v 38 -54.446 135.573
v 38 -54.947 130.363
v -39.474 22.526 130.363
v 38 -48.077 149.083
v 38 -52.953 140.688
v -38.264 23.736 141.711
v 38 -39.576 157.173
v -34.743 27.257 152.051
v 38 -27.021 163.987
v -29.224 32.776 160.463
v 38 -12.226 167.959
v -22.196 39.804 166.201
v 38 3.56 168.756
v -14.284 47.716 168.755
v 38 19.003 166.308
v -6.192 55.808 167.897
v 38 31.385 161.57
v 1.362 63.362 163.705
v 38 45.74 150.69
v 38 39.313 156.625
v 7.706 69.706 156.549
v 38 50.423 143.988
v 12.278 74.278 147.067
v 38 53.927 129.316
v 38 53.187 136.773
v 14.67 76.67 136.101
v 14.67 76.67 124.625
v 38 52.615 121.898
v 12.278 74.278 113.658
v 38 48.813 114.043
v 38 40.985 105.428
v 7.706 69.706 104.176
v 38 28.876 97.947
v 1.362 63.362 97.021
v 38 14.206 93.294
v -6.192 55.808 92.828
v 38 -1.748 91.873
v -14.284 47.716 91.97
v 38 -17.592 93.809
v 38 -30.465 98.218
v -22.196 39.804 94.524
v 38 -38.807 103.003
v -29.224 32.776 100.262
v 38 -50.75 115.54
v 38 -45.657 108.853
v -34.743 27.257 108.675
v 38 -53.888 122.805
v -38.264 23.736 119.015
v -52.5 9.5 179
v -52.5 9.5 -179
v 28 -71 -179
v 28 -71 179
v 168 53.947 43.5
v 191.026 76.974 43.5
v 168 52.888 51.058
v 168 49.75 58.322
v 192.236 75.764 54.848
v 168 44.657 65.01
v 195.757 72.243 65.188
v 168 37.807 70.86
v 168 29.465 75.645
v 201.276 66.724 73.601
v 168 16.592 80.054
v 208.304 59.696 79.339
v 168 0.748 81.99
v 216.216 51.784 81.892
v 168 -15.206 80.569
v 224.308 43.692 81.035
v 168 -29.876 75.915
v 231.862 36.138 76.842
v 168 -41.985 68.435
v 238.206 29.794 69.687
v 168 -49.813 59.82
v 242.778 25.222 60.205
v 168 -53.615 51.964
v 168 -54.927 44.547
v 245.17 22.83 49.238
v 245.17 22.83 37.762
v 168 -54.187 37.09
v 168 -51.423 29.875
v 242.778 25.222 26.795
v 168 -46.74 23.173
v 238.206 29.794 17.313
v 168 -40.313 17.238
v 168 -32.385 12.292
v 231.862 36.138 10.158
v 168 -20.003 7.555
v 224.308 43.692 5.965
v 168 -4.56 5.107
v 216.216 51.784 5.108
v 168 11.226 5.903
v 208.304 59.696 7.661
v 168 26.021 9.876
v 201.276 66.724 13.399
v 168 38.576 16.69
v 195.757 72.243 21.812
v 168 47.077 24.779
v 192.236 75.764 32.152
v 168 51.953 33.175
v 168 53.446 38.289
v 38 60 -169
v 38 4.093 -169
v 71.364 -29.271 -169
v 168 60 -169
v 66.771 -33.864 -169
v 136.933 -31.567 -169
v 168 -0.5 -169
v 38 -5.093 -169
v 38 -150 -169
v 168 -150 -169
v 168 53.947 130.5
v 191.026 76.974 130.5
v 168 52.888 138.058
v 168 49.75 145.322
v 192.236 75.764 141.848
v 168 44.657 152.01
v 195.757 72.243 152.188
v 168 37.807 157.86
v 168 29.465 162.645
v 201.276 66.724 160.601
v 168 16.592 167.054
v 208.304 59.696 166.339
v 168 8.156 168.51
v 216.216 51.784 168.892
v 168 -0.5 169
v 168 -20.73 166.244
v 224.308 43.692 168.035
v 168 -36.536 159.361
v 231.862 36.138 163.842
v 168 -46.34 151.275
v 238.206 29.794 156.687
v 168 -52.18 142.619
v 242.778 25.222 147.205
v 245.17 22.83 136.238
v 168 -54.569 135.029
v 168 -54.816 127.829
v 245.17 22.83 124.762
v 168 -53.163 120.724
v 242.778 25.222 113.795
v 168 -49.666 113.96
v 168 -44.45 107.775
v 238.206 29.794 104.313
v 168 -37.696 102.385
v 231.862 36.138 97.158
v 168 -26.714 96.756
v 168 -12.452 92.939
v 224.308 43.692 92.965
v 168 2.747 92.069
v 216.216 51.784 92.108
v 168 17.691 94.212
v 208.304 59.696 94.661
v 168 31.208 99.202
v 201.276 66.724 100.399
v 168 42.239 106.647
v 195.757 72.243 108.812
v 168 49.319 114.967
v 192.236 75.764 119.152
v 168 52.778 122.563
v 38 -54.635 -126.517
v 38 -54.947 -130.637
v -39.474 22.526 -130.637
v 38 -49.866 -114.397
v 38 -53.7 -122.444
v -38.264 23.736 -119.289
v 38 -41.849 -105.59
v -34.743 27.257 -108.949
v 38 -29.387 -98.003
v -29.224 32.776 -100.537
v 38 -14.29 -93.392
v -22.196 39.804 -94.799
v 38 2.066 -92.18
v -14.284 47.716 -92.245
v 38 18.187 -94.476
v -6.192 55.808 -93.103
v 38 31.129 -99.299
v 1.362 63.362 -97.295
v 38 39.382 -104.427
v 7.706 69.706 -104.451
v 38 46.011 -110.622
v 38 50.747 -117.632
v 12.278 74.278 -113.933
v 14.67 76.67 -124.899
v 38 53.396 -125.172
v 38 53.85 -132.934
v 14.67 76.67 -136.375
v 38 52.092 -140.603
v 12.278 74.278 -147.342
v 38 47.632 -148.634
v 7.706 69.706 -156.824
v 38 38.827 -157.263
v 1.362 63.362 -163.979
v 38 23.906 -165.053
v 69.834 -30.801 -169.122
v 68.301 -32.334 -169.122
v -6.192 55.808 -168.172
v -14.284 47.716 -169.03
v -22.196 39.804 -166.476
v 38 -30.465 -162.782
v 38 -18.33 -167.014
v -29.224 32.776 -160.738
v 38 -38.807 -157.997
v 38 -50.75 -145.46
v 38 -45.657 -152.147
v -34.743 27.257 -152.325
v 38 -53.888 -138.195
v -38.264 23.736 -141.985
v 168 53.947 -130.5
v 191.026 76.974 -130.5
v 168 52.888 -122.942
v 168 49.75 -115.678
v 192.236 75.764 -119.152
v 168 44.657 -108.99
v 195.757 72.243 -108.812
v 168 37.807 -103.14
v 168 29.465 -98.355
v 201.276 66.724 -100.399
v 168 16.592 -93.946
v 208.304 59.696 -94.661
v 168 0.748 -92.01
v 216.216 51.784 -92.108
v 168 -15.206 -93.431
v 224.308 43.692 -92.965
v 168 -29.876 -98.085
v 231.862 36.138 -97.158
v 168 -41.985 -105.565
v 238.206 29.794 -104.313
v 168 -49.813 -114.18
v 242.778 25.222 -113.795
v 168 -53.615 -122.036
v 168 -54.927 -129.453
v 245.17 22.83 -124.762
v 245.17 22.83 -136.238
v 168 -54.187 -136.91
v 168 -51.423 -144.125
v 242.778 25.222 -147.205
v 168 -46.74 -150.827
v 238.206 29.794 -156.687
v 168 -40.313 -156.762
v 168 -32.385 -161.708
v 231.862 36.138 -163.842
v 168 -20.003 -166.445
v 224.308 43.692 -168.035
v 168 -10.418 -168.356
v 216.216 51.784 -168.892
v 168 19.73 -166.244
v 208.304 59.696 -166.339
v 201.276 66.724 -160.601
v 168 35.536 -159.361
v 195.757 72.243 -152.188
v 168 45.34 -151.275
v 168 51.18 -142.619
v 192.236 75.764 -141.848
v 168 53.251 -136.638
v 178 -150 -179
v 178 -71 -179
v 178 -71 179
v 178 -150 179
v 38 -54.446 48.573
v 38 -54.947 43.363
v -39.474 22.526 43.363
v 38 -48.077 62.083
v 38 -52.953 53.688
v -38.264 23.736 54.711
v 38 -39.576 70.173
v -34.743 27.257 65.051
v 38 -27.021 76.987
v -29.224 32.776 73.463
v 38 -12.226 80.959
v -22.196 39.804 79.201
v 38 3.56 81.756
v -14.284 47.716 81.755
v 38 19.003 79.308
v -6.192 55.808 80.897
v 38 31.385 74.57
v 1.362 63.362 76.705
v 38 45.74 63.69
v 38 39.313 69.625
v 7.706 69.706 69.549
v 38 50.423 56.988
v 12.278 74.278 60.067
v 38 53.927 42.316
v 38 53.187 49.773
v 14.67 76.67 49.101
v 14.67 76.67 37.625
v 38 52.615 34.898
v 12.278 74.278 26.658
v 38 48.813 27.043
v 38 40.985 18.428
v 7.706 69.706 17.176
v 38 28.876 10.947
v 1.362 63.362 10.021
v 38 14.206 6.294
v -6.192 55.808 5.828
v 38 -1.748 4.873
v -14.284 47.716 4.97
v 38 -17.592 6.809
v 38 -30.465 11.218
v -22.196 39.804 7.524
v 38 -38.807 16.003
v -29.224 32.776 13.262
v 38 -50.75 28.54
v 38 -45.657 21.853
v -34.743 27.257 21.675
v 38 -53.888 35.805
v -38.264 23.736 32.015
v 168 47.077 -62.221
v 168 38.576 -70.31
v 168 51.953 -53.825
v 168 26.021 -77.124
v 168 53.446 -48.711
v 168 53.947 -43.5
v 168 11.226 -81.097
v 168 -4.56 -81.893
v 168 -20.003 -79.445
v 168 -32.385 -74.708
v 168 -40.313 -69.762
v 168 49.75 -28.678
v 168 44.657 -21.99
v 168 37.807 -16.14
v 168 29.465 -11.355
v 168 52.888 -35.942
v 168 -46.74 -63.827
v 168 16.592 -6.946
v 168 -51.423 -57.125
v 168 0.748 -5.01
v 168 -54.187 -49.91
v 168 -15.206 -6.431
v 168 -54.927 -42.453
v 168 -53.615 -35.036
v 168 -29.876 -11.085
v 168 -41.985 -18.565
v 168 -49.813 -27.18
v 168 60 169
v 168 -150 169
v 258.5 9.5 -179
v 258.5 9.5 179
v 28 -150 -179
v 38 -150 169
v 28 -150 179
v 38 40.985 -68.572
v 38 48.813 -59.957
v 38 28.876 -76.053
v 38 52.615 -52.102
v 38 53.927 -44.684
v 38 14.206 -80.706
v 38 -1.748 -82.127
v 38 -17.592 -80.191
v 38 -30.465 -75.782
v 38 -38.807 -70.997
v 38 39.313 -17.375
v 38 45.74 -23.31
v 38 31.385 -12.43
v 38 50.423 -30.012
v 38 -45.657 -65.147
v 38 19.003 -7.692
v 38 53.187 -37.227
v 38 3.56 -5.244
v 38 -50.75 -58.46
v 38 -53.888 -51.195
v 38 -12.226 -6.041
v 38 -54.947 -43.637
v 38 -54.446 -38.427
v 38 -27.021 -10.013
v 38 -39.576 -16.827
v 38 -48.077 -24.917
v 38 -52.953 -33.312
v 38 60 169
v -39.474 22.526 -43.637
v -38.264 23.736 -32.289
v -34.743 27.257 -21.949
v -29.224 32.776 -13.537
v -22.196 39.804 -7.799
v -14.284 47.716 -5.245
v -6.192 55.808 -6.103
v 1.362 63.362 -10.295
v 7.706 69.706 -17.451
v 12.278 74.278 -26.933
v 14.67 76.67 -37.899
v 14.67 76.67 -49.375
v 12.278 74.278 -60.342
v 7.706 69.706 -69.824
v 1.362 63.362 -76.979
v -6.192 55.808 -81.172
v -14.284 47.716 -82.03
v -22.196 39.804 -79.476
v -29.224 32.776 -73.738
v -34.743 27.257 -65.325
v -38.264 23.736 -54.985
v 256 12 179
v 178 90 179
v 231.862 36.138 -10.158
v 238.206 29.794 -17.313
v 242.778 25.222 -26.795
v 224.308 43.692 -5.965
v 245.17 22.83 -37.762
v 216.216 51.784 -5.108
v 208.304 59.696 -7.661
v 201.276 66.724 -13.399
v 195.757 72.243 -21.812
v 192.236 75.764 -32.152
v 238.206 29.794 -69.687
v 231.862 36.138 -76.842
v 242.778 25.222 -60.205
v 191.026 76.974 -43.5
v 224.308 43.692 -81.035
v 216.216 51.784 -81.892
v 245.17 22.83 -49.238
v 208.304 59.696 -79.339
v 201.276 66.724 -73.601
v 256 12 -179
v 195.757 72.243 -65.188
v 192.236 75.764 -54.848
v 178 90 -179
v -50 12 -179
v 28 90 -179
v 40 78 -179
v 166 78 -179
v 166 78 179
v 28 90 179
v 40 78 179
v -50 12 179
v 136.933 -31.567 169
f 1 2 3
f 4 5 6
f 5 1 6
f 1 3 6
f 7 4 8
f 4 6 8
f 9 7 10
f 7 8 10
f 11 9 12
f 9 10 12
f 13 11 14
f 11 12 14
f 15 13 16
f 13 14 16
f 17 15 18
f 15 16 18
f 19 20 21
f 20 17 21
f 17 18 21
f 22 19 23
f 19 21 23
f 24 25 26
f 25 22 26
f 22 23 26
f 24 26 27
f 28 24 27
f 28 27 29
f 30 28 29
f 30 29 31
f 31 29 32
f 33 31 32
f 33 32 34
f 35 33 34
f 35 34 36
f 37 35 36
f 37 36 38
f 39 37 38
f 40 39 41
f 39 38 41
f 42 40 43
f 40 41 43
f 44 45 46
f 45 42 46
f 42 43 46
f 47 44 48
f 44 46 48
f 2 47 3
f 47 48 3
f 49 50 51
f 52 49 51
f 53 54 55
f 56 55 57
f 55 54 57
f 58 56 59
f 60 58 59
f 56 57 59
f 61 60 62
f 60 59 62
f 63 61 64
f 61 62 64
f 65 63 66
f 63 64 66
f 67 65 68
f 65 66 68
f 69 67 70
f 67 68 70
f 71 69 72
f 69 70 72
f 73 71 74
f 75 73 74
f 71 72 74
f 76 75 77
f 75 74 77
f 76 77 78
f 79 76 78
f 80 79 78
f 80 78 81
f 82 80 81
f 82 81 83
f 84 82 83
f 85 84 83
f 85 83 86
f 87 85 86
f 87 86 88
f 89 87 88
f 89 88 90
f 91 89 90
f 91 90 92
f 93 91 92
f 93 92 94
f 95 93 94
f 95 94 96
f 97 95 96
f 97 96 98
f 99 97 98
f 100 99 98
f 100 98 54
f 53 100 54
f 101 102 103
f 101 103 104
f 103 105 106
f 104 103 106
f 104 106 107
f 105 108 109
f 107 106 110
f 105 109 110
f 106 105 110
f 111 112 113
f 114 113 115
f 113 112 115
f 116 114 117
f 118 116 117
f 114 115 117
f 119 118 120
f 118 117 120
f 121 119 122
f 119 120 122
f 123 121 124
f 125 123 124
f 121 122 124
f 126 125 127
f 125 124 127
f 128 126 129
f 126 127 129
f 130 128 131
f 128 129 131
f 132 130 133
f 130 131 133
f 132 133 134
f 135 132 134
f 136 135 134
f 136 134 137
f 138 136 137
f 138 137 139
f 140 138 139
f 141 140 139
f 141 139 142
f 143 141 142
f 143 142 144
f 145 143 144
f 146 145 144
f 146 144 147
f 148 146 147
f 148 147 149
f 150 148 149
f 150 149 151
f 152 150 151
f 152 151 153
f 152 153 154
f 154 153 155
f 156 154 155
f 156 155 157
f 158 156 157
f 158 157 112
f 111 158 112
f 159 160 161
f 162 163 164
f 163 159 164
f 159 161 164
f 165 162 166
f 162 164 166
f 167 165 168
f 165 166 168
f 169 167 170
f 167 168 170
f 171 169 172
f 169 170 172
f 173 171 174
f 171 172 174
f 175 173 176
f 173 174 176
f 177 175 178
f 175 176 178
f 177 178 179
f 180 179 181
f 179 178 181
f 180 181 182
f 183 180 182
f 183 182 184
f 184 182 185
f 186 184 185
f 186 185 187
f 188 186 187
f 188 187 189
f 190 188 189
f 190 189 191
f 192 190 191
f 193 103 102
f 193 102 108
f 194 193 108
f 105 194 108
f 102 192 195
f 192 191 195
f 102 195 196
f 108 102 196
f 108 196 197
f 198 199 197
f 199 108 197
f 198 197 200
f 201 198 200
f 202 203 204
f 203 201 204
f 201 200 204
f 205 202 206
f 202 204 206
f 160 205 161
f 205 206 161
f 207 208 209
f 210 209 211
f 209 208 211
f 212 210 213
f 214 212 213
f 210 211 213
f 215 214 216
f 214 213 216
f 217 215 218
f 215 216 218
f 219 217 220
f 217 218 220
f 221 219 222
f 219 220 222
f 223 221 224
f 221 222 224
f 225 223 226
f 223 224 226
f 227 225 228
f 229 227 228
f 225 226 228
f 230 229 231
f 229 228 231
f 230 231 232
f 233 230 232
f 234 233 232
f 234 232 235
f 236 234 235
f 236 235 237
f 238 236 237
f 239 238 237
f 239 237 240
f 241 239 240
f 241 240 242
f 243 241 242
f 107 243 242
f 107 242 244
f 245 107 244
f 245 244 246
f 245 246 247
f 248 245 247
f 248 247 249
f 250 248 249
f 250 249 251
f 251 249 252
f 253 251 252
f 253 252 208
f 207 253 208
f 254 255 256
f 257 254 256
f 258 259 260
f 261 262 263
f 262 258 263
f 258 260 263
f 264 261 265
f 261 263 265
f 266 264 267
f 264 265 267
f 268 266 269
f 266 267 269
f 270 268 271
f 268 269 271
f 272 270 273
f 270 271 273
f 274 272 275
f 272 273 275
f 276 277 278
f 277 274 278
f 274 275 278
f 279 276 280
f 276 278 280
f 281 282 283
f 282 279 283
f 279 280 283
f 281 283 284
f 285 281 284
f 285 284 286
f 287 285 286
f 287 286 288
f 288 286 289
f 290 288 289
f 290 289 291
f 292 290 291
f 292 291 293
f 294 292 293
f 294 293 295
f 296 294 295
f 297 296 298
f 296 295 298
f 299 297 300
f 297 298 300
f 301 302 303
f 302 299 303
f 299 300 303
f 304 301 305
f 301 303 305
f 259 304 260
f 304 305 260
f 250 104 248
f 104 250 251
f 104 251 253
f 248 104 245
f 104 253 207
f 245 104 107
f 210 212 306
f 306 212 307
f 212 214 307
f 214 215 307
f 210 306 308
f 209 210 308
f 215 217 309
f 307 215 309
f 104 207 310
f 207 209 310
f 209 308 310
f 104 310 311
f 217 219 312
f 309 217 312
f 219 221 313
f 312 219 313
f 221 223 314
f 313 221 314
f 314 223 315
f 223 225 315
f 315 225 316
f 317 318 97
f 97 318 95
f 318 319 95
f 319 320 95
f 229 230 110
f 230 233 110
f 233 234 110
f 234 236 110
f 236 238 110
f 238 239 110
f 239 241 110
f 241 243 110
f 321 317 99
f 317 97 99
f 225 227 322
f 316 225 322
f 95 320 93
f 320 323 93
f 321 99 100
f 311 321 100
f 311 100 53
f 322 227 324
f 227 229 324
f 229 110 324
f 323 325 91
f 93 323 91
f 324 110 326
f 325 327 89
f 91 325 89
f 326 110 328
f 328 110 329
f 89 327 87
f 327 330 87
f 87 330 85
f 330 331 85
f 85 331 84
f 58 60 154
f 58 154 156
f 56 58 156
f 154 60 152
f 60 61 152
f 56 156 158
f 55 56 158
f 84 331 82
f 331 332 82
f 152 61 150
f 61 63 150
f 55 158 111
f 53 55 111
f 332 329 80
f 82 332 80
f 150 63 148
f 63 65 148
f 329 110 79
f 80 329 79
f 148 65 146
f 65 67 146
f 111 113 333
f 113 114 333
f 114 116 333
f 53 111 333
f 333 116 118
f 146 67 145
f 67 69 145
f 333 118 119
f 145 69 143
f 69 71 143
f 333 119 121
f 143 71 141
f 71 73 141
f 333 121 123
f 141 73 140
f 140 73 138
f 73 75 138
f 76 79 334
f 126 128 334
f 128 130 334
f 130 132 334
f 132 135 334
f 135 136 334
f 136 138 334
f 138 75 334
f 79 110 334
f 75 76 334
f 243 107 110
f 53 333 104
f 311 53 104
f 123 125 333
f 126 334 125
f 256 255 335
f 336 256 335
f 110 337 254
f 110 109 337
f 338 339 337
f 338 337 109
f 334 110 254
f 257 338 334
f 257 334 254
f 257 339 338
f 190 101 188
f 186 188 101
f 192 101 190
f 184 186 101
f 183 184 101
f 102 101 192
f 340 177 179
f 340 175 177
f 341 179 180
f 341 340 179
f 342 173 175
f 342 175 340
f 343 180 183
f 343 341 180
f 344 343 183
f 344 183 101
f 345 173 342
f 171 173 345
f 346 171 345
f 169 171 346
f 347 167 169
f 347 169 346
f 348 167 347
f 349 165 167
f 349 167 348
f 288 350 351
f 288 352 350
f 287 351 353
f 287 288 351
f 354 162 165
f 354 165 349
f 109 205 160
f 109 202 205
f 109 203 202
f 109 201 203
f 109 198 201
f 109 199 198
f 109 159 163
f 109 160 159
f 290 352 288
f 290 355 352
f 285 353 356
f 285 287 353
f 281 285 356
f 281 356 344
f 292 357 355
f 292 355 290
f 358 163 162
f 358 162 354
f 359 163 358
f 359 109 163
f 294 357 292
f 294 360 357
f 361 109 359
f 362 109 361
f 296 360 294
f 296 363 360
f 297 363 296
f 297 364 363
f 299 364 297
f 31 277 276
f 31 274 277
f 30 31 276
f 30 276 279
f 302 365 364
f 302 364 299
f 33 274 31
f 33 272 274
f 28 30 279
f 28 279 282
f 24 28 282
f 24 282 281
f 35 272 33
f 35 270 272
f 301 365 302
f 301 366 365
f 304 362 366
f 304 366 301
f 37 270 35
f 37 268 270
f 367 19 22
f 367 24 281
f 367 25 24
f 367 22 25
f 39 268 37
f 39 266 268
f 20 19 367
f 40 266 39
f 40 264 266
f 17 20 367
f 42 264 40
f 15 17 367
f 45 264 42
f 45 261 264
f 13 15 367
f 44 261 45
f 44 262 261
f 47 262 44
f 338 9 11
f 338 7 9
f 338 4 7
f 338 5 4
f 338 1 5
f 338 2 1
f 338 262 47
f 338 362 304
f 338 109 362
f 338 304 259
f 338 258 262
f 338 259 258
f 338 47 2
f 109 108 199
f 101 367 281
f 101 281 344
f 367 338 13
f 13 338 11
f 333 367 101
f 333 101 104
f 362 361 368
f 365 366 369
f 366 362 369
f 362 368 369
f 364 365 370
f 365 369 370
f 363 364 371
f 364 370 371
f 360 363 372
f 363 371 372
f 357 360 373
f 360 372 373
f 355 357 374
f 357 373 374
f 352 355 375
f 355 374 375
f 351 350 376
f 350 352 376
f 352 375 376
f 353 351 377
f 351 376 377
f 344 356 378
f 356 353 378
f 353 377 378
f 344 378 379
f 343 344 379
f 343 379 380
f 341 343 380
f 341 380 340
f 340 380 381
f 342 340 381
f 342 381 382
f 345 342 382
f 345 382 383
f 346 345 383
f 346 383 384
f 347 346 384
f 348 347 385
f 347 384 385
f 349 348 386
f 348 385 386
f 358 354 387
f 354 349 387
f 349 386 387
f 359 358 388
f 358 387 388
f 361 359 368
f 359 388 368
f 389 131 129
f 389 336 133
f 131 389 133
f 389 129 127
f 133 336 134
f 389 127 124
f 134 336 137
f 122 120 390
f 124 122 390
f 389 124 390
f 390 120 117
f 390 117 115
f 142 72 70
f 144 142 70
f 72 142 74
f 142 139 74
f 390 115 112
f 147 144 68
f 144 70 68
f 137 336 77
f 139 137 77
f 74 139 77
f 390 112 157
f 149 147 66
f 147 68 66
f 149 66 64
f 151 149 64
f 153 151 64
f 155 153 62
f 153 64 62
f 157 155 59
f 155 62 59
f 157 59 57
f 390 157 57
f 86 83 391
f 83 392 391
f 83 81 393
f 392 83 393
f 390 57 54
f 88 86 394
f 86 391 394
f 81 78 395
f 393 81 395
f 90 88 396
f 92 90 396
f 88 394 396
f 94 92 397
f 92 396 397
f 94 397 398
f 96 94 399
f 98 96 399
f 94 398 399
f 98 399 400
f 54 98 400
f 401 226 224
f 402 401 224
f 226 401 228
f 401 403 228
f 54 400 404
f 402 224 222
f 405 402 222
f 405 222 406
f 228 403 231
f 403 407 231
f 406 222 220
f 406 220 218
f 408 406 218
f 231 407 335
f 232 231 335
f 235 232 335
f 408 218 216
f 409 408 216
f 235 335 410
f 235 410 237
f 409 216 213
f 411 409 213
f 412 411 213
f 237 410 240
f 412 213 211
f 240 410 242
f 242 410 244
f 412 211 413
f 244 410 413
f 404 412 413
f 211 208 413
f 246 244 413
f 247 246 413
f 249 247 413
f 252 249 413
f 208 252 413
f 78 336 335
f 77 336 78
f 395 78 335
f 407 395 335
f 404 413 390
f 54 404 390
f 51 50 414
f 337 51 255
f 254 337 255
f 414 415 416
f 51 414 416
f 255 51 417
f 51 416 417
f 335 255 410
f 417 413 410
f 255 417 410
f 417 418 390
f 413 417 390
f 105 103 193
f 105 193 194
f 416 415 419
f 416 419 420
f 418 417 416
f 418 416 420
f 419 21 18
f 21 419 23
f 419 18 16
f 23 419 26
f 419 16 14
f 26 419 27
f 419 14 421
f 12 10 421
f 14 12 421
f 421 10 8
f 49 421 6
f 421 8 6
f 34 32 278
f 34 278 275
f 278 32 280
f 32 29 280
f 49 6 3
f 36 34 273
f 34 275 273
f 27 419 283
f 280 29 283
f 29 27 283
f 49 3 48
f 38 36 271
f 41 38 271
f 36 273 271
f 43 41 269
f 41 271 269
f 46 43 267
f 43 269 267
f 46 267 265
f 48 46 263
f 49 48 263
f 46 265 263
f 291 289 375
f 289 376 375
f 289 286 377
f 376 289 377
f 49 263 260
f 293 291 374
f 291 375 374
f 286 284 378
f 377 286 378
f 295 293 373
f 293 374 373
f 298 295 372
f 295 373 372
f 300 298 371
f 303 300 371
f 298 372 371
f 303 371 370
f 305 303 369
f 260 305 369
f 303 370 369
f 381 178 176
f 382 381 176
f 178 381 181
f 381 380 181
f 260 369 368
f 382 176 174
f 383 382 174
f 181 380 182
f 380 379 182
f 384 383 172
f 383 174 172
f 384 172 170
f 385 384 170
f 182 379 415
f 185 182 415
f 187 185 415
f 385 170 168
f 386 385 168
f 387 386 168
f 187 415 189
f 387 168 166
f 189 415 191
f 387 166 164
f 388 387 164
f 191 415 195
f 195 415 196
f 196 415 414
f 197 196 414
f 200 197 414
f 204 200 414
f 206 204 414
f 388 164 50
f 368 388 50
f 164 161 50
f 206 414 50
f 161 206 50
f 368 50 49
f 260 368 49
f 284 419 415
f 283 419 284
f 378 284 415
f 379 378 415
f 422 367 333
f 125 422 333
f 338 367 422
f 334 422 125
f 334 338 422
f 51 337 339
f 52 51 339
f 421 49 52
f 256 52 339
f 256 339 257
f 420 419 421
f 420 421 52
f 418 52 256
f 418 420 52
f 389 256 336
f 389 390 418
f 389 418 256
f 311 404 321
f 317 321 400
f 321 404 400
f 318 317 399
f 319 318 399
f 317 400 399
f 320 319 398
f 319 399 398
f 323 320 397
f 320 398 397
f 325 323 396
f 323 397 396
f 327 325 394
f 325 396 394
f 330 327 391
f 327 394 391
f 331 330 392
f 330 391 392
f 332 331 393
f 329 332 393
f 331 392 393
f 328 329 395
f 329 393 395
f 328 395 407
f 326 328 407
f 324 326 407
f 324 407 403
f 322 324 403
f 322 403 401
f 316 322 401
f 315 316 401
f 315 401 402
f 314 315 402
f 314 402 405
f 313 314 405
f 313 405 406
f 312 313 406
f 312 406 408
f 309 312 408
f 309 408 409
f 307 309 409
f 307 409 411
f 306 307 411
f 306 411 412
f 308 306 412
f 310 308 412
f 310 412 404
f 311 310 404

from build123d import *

# Parameters (mm, degrees)
SKETCH1_W           = 100
SKETCH1_H           = 358
BOSS_EXTRUDE1_DEPTH = 90
CHAMFER1_START      = -100
CHAMFER1_OUTLINE_W  = 113
CHAMFER1_OUTLINE_H  = 358
CHAMFER1_DEPTH      = 56.159379566
SKETCH3_W           = 358
SKETCH3_H           = 90
BOSS_EXTRUDE2_DEPTH = 53
SKETCH4_W           = 150
SKETCH4_H           = 358
BOSS_EXTRUDE3_DEPTH = 150
SKETCH5_W           = 78
SKETCH5_H           = 358
CUT_EXTRUDE2_DEPTH  = 12
CHAMFER3_SIZE       = 83
SKETCH6_W           = 124
SKETCH6_H           = 358
CUT_EXTRUDE3_DEPTH  = 12
CHAMFER4_SIZE       = 13
SKETCH7_R           = 38.5
CUT_EXTRUDE4_DEPTH  = 115
SKETCH8_R           = 38.5
CUT_EXTRUDE5_DEPTH  = 115
SKETCH9_W           = 130
SKETCH9_H           = 338
CUT_EXTRUDE6_DEPTH  = 210


with BuildPart() as part:
    # Sketch1 → Boss-Extrude1 (new body)
    with BuildSketch(Plane(origin=(0, 0, 0), x_dir=(1, 0, 0), z_dir=(0, 1, 0))):
        Rectangle(SKETCH1_W, SKETCH1_H)
    extrude(amount=BOSS_EXTRUDE1_DEPTH)

    # Chamfer1: read off the stored shape, not the designer's step
    # Chamfer1 outline → Chamfer1 (cut)
    with BuildSketch(Plane(origin=(0, 0, 0), x_dir=(0.7071067811865474, 0.7071067811865477, 0), z_dir=(0.7071067811865476, -0.7071067811865476, 0)).offset(CHAMFER1_START)):
        with Locations((28.5, 0)):
            Rectangle(CHAMFER1_OUTLINE_W, CHAMFER1_OUTLINE_H)
    extrude(amount=CHAMFER1_DEPTH, mode=Mode.SUBTRACT)

    # Sketch3 → Boss-Extrude2 (add)
    with BuildSketch(Plane(origin=(50, 0, 0), x_dir=(0, 0, -1), z_dir=(1, 0, 0))):
        with Locations((0, 45)):
            Rectangle(SKETCH3_W, SKETCH3_H)
    extrude(amount=BOSS_EXTRUDE2_DEPTH)

    # Mirror2: part across plane


with BuildPart() as part_1:
    add(part.part)
    add(part.part.mirror(Plane(origin=(103, 0, 0), x_dir=(0, 0, 1), z_dir=(1, 0, 0))))

    # Sketch4 → Boss-Extrude3 (add)
    with BuildSketch(Plane.XZ):
        with Locations((103, 0)):
            Rectangle(SKETCH4_W, SKETCH4_H)
    extrude(amount=BOSS_EXTRUDE3_DEPTH)

    # Sketch5 → Cut-Extrude2 (cut)
    with BuildSketch(Plane.XZ):
        with Locations((-11, 0)):
            Rectangle(SKETCH5_W, SKETCH5_H)
        with Locations((217, 0)):
            Rectangle(SKETCH5_W, SKETCH5_H)
    extrude(amount=-CUT_EXTRUDE2_DEPTH, mode=Mode.SUBTRACT)

    # Chamfer3
    # the kernel refuses this chamfer: 83 mm, written as the material it adds along each edge
    with BuildSketch(Plane(origin=(178, 12, 179), x_dir=(0, -1, 0), z_dir=(0, 0, -1))) as chamfer3_piece_1_section:
        Polygon((CHAMFER3_SIZE, 0), (0, -CHAMFER3_SIZE), (0, 0), align=None)
    chamfer3_piece_1 = extrude(amount=358, mode=Mode.PRIVATE)
    chamfer3_piece_1 = split(chamfer3_piece_1, bisect_by=Plane(origin=(217, 51, 179), z_dir=(-0.7071067811865476, -0.7071067811865476, 0)), keep=Keep.TOP, mode=Mode.PRIVATE)
    add(chamfer3_piece_1)
    with BuildSketch(Plane(origin=(28, 12, 179), x_dir=(-1, 0, 0), z_dir=(0, 0, -1))) as chamfer3_piece_2_section:
        Polygon((CHAMFER3_SIZE, 0), (0, -CHAMFER3_SIZE), (0, 0), align=None)
    chamfer3_piece_2 = extrude(amount=358, mode=Mode.PRIVATE)
    chamfer3_piece_2 = split(chamfer3_piece_2, bisect_by=Plane(origin=(-11, 51, 179), z_dir=(0.7071067811865476, -0.7071067811865476, 0)), keep=Keep.TOP, mode=Mode.PRIVATE)
    add(chamfer3_piece_2)

    # Sketch6 → Cut-Extrude3 (cut)
    with BuildSketch(Plane(origin=(0, 90, 0), x_dir=(1, 0, 0), z_dir=(0, 1, 0))):
        with Locations((103, 0)):
            Rectangle(SKETCH6_W, SKETCH6_H)
    extrude(amount=-CUT_EXTRUDE3_DEPTH, mode=Mode.SUBTRACT)

    # Chamfer4
    # the kernel refuses this chamfer: 13 mm, written as the material it takes off along each edge
    with BuildSketch(Plane(origin=(165, 90, 212.431878844), x_dir=(0, -1, 0), z_dir=(0, 0, -1))) as chamfer4_piece_1_section:
        Polygon((CHAMFER4_SIZE, 0), (0, -CHAMFER4_SIZE), (0, 0), align=None)
    chamfer4_piece_1 = extrude(amount=424.863757687, mode=Mode.PRIVATE)
    chamfer4_piece_1 = split(chamfer4_piece_1, bisect_by=Plane(origin=(165, 78, 212.431878844), z_dir=(0, 1, 0)), keep=Keep.TOP, mode=Mode.PRIVATE)
    add(chamfer4_piece_1, mode=Mode.SUBTRACT)
    with BuildSketch(Plane(origin=(41, 90, -212.431878844), x_dir=(-1, 0, 0), z_dir=(0, 0, 1))) as chamfer4_piece_2_section:
        Polygon((CHAMFER4_SIZE, 0), (0, CHAMFER4_SIZE), (0, 0), align=None)
    chamfer4_piece_2 = extrude(amount=424.863757687, mode=Mode.PRIVATE)
    chamfer4_piece_2 = split(chamfer4_piece_2, bisect_by=Plane(origin=(41, 78, -212.431878844), z_dir=(0, 1, 0)), keep=Keep.TOP, mode=Mode.PRIVATE)
    add(chamfer4_piece_2, mode=Mode.SUBTRACT)

    # Sketch7 → Cut-Extrude4 (cut)
    with BuildSketch(Plane(origin=(-31, 31, 0), x_dir=(0, 0, 1), z_dir=(-0.7071067811865477, 0.7071067811865475, 0))):
        with Locations(Location((130.362769157, 26.516504294, 0), (0, 0, 270))):
            Circle(SKETCH7_R)
        with Locations(Location((43.362769157, 26.516504294, 0), (0, 0, 270))):
            Circle(SKETCH7_R)
        with Locations(Location((-43.637230843, 26.516504294, 0), (0, 0, 270))):
            Circle(SKETCH7_R)
        with Locations(Location((-130.637230843, 26.516504294, 0), (0, 0, 270))):
            Circle(SKETCH7_R)
    extrude(amount=-CUT_EXTRUDE4_DEPTH, mode=Mode.SUBTRACT)

    # Sketch8 → Cut-Extrude5 (cut)
    with BuildSketch(Plane(origin=(134, 134, 0), x_dir=(0, 0, -1), z_dir=(0.7071067811865477, 0.7071067811865475, 0))):
        with Locations(Location((-130.5, -119.14749263, 0), (0, 0, 90))):
            Circle(SKETCH8_R)
        with Locations(Location((-43.5, -119.14749263, 0), (0, 0, 90))):
            Circle(SKETCH8_R)
        with Locations(Location((43.5, -119.14749263, 0), (0, 0, 90))):
            Circle(SKETCH8_R)
        with Locations(Location((130.5, -119.14749263, 0), (0, 0, 90))):
            Circle(SKETCH8_R)
    extrude(amount=-CUT_EXTRUDE5_DEPTH, mode=Mode.SUBTRACT)

    # Sketch9 → Cut-Extrude6 (cut)
    with BuildSketch(Plane.XZ.offset(150)):
        with Locations((103, 0)):
            Rectangle(SKETCH9_W, SKETCH9_H)
    extrude(amount=-CUT_EXTRUDE6_DEPTH, mode=Mode.SUBTRACT)


solid = part_1.part
